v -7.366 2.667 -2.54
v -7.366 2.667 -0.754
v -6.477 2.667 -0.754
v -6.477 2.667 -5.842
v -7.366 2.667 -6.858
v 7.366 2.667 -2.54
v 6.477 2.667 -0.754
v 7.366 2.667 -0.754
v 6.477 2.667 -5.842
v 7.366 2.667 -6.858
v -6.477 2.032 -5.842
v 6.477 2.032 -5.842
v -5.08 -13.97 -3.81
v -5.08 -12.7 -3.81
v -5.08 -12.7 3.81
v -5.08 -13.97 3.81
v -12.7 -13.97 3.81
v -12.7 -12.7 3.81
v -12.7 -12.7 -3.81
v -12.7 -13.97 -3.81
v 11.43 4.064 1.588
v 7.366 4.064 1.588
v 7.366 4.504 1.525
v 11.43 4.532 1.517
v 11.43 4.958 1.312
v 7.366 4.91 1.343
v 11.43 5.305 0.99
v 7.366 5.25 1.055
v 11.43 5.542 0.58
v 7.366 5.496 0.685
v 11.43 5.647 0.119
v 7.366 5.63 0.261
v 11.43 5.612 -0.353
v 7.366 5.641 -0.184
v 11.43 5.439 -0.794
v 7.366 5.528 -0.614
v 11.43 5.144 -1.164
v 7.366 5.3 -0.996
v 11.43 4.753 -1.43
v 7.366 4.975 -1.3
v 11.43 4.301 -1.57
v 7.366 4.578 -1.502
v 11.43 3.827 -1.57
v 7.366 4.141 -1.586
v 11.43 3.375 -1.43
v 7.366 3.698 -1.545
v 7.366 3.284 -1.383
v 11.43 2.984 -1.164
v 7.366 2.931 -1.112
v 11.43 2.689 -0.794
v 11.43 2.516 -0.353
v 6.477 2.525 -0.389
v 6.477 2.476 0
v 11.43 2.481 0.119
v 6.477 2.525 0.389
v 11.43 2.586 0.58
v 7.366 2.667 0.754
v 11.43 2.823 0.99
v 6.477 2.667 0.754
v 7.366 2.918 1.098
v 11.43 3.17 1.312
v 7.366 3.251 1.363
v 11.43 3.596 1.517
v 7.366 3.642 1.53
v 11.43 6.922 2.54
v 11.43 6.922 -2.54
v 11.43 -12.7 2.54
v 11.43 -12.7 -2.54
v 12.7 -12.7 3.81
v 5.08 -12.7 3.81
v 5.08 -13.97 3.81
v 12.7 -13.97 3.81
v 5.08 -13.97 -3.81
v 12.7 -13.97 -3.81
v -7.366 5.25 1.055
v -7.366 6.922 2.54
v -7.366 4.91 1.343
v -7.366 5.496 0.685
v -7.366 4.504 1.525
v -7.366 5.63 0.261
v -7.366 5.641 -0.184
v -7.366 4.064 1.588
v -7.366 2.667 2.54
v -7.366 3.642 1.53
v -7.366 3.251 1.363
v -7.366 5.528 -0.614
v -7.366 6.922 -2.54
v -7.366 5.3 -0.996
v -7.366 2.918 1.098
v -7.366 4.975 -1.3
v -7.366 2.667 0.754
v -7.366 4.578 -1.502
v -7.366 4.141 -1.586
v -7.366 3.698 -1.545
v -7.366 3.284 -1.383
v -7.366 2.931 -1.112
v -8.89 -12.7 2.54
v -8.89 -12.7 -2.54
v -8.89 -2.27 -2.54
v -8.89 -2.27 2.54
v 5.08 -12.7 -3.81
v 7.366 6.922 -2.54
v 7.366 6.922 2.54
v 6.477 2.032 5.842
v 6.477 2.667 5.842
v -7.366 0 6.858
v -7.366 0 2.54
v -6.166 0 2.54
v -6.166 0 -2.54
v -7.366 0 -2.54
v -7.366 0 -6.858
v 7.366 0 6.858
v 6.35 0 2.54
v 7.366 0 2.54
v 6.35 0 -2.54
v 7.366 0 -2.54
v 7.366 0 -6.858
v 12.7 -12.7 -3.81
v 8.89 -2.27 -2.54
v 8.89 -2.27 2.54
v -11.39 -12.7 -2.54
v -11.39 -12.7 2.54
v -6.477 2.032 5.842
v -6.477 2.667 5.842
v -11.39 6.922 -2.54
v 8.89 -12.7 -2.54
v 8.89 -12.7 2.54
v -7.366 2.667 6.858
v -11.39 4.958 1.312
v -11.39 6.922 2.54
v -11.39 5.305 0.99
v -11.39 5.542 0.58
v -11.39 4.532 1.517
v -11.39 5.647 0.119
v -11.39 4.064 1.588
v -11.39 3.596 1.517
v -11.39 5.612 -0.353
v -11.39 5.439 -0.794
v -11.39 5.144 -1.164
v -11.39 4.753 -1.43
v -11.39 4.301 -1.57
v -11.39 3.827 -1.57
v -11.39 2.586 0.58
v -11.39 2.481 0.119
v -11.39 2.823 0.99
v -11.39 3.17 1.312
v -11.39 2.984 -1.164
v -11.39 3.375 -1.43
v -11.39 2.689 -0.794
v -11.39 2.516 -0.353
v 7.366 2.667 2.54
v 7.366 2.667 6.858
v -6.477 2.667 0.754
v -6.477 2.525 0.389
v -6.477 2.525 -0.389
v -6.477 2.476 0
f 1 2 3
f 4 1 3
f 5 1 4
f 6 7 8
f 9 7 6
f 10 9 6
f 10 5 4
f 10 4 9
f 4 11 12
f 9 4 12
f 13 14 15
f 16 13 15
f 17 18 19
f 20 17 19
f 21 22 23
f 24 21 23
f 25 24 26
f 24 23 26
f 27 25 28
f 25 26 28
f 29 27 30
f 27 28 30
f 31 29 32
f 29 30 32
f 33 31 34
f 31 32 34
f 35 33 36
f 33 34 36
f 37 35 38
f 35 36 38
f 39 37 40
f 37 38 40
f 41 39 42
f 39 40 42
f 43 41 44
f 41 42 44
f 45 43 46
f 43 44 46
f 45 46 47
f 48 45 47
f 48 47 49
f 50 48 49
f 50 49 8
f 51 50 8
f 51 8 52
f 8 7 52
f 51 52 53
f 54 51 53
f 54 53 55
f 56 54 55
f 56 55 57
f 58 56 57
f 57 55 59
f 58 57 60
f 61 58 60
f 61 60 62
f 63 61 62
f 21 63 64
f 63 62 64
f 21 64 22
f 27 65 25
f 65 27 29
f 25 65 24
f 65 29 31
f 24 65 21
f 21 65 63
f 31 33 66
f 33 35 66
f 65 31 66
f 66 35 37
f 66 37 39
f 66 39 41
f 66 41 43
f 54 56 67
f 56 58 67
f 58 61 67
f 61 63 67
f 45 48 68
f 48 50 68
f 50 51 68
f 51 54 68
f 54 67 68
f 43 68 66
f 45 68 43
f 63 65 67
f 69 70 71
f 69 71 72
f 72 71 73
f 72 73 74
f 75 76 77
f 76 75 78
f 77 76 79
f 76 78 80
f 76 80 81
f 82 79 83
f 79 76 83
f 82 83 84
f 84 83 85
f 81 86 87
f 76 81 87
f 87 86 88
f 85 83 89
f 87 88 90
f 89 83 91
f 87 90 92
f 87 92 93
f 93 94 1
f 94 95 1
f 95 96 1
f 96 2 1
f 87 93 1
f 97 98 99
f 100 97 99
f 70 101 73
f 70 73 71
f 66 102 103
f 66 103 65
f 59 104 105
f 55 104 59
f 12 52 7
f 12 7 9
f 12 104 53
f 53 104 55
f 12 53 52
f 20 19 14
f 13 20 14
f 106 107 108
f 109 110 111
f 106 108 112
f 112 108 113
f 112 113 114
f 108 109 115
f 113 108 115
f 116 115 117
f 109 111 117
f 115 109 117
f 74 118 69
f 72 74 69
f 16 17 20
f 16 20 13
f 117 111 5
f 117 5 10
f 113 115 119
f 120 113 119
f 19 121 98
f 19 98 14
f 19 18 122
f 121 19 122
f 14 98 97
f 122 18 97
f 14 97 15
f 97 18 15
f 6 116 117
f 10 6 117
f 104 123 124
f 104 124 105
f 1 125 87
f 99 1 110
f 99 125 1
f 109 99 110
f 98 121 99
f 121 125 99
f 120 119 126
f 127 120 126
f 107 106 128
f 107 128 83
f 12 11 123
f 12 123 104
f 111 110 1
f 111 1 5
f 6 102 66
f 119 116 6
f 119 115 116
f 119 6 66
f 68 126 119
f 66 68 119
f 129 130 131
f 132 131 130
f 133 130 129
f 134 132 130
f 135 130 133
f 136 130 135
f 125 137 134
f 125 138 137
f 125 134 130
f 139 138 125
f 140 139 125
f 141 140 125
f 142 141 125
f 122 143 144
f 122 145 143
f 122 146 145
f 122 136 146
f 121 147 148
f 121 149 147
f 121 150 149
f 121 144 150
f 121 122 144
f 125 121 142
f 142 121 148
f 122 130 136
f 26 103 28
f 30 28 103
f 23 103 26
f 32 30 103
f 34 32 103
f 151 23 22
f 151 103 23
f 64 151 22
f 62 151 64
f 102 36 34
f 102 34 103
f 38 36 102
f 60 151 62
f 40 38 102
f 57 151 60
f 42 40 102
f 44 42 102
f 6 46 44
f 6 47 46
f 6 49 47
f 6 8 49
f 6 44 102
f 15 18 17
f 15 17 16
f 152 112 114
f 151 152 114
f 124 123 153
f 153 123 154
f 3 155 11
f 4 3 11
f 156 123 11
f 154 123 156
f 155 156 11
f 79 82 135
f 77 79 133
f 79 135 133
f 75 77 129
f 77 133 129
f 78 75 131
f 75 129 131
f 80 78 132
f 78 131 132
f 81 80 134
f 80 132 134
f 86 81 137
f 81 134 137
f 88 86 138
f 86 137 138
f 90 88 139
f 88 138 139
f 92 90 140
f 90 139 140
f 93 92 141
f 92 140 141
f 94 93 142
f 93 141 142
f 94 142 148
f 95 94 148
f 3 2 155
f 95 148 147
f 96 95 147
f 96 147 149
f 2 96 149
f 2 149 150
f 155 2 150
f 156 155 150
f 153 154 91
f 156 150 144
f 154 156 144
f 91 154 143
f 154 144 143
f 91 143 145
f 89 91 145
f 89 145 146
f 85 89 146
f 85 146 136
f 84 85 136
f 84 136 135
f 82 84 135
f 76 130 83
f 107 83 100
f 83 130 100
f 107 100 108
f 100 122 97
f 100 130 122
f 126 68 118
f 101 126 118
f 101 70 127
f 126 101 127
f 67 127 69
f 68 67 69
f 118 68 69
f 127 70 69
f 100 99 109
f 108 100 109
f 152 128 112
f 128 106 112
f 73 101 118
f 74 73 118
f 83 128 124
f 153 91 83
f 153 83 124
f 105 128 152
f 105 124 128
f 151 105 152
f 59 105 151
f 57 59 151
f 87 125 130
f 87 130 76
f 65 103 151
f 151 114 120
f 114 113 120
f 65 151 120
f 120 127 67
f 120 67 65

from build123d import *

# Parameters (mm, degrees)
SKETCH1_W            = 14.732
SKETCH1_H            = 13.716
BOSS_EXTRUDE1_DEPTH  = 2.032
SKETCH6_W            = 25.4
SKETCH6_H            = 5.08
BOSS_EXTRUDE2_DEPTH  = 12.7
SKETCH16_W           = 7.62
SKETCH16_H           = 7.62
BOSS_EXTRUDE5_DEPTH  = 1.27
SKETCH15_W           = 1.27
SKETCH15_H           = 12.7
SKETCH15_W_2         = 1.31
CUT_EXTRUDE5_DEPTH   = 10
SKETCH17_W           = 4.024
SKETCH17_H           = 5.08
BOSS_EXTRUDE10_DEPTH = 6.9215
SKETCH21_W           = 4.064
SKETCH21_H           = 5.08
BOSS_EXTRUDE11_DEPTH = 6.9215
SKETCH24_W           = 14.732
SKETCH24_H           = 13.716
SKETCH24_W_2         = 12.954
SKETCH24_H_2         = 11.684
BOSS_EXTRUDE12_DEPTH = 0.635
SKETCH23_R           = 1.5875
CUT_EXTRUDE6_DEPTH   = 25.7175


with BuildPart() as part:
    # Sketch1 → Boss-Extrude1 (new body)
    with BuildSketch(Plane(origin=(0, 0, 0), x_dir=(1, 0, 0), z_dir=(0, 1, 0))):
        Rectangle(SKETCH1_W, SKETCH1_H)
    extrude(amount=BOSS_EXTRUDE1_DEPTH)

    # Sketch6 → Boss-Extrude2 (add)
    with BuildSketch(Plane(origin=(0, 0, 0), x_dir=(-1, 0, 0), z_dir=(0, -1, 0))):
        Rectangle(SKETCH6_W, SKETCH6_H)
    extrude(amount=BOSS_EXTRUDE2_DEPTH)

    # Sketch16 → Boss-Extrude5 (add)
    with BuildSketch(Plane.XZ.offset(12.7)):
        with Locations((8.89, 0)):
            Rectangle(SKETCH16_W, SKETCH16_H)
        with Locations((-8.89, 0)):
            Rectangle(SKETCH16_W, SKETCH16_H)
    extrude(amount=BOSS_EXTRUDE5_DEPTH)

    # Sketch15 → Cut-Extrude5 (cut)
    with BuildSketch(Plane(origin=(0, 0, -2.54), x_dir=(-1, 0, 0), z_dir=(0, 0, -1))):
        with Locations((-12.065, -6.35)):
            Rectangle(SKETCH15_W, SKETCH15_H)
        Polygon((-8.89, -2.27), (-8.89, -12.7), (8.89, -12.7), (8.89, -2.27), (6.166, 0), (-6.35, 0), align=None)
        with Locations((12.045, -6.35)):
            Rectangle(SKETCH15_W_2, SKETCH15_H)
    extrude(amount=-CUT_EXTRUDE5_DEPTH, mode=Mode.SUBTRACT)

    # Sketch17 → Boss-Extrude10 (add)
    with BuildSketch(Plane(origin=(0, 0, 0), x_dir=(1, 0, 0), z_dir=(0, 1, 0))):
        with Locations((-9.378, 0)):
            Rectangle(SKETCH17_W, SKETCH17_H)
    extrude(amount=BOSS_EXTRUDE10_DEPTH)

    # Sketch21 → Boss-Extrude11 (add)
    with BuildSketch(Plane(origin=(0, 0, 0), x_dir=(1, 0, 0), z_dir=(0, 1, 0))):
        with Locations((9.398, 0)):
            Rectangle(SKETCH21_W, SKETCH21_H)
    extrude(amount=BOSS_EXTRUDE11_DEPTH)

    # Sketch24 → Boss-Extrude12 (add)
    with BuildSketch(Plane(origin=(0, 2.032, 0), x_dir=(1, 0, 0), z_dir=(0, 1, 0))):
        Rectangle(SKETCH24_W, SKETCH24_H)
        Rectangle(SKETCH24_W_2, SKETCH24_H_2, mode=Mode.SUBTRACT)
    extrude(amount=BOSS_EXTRUDE12_DEPTH)

    # Sketch23 → Cut-Extrude6 (cut)
    with BuildSketch(Plane.ZY.offset(11.39)):
        with Locations((0, 4.064)):
            Circle(SKETCH23_R)
    extrude(amount=-CUT_EXTRUDE6_DEPTH, mode=Mode.SUBTRACT)


solid = part.part
